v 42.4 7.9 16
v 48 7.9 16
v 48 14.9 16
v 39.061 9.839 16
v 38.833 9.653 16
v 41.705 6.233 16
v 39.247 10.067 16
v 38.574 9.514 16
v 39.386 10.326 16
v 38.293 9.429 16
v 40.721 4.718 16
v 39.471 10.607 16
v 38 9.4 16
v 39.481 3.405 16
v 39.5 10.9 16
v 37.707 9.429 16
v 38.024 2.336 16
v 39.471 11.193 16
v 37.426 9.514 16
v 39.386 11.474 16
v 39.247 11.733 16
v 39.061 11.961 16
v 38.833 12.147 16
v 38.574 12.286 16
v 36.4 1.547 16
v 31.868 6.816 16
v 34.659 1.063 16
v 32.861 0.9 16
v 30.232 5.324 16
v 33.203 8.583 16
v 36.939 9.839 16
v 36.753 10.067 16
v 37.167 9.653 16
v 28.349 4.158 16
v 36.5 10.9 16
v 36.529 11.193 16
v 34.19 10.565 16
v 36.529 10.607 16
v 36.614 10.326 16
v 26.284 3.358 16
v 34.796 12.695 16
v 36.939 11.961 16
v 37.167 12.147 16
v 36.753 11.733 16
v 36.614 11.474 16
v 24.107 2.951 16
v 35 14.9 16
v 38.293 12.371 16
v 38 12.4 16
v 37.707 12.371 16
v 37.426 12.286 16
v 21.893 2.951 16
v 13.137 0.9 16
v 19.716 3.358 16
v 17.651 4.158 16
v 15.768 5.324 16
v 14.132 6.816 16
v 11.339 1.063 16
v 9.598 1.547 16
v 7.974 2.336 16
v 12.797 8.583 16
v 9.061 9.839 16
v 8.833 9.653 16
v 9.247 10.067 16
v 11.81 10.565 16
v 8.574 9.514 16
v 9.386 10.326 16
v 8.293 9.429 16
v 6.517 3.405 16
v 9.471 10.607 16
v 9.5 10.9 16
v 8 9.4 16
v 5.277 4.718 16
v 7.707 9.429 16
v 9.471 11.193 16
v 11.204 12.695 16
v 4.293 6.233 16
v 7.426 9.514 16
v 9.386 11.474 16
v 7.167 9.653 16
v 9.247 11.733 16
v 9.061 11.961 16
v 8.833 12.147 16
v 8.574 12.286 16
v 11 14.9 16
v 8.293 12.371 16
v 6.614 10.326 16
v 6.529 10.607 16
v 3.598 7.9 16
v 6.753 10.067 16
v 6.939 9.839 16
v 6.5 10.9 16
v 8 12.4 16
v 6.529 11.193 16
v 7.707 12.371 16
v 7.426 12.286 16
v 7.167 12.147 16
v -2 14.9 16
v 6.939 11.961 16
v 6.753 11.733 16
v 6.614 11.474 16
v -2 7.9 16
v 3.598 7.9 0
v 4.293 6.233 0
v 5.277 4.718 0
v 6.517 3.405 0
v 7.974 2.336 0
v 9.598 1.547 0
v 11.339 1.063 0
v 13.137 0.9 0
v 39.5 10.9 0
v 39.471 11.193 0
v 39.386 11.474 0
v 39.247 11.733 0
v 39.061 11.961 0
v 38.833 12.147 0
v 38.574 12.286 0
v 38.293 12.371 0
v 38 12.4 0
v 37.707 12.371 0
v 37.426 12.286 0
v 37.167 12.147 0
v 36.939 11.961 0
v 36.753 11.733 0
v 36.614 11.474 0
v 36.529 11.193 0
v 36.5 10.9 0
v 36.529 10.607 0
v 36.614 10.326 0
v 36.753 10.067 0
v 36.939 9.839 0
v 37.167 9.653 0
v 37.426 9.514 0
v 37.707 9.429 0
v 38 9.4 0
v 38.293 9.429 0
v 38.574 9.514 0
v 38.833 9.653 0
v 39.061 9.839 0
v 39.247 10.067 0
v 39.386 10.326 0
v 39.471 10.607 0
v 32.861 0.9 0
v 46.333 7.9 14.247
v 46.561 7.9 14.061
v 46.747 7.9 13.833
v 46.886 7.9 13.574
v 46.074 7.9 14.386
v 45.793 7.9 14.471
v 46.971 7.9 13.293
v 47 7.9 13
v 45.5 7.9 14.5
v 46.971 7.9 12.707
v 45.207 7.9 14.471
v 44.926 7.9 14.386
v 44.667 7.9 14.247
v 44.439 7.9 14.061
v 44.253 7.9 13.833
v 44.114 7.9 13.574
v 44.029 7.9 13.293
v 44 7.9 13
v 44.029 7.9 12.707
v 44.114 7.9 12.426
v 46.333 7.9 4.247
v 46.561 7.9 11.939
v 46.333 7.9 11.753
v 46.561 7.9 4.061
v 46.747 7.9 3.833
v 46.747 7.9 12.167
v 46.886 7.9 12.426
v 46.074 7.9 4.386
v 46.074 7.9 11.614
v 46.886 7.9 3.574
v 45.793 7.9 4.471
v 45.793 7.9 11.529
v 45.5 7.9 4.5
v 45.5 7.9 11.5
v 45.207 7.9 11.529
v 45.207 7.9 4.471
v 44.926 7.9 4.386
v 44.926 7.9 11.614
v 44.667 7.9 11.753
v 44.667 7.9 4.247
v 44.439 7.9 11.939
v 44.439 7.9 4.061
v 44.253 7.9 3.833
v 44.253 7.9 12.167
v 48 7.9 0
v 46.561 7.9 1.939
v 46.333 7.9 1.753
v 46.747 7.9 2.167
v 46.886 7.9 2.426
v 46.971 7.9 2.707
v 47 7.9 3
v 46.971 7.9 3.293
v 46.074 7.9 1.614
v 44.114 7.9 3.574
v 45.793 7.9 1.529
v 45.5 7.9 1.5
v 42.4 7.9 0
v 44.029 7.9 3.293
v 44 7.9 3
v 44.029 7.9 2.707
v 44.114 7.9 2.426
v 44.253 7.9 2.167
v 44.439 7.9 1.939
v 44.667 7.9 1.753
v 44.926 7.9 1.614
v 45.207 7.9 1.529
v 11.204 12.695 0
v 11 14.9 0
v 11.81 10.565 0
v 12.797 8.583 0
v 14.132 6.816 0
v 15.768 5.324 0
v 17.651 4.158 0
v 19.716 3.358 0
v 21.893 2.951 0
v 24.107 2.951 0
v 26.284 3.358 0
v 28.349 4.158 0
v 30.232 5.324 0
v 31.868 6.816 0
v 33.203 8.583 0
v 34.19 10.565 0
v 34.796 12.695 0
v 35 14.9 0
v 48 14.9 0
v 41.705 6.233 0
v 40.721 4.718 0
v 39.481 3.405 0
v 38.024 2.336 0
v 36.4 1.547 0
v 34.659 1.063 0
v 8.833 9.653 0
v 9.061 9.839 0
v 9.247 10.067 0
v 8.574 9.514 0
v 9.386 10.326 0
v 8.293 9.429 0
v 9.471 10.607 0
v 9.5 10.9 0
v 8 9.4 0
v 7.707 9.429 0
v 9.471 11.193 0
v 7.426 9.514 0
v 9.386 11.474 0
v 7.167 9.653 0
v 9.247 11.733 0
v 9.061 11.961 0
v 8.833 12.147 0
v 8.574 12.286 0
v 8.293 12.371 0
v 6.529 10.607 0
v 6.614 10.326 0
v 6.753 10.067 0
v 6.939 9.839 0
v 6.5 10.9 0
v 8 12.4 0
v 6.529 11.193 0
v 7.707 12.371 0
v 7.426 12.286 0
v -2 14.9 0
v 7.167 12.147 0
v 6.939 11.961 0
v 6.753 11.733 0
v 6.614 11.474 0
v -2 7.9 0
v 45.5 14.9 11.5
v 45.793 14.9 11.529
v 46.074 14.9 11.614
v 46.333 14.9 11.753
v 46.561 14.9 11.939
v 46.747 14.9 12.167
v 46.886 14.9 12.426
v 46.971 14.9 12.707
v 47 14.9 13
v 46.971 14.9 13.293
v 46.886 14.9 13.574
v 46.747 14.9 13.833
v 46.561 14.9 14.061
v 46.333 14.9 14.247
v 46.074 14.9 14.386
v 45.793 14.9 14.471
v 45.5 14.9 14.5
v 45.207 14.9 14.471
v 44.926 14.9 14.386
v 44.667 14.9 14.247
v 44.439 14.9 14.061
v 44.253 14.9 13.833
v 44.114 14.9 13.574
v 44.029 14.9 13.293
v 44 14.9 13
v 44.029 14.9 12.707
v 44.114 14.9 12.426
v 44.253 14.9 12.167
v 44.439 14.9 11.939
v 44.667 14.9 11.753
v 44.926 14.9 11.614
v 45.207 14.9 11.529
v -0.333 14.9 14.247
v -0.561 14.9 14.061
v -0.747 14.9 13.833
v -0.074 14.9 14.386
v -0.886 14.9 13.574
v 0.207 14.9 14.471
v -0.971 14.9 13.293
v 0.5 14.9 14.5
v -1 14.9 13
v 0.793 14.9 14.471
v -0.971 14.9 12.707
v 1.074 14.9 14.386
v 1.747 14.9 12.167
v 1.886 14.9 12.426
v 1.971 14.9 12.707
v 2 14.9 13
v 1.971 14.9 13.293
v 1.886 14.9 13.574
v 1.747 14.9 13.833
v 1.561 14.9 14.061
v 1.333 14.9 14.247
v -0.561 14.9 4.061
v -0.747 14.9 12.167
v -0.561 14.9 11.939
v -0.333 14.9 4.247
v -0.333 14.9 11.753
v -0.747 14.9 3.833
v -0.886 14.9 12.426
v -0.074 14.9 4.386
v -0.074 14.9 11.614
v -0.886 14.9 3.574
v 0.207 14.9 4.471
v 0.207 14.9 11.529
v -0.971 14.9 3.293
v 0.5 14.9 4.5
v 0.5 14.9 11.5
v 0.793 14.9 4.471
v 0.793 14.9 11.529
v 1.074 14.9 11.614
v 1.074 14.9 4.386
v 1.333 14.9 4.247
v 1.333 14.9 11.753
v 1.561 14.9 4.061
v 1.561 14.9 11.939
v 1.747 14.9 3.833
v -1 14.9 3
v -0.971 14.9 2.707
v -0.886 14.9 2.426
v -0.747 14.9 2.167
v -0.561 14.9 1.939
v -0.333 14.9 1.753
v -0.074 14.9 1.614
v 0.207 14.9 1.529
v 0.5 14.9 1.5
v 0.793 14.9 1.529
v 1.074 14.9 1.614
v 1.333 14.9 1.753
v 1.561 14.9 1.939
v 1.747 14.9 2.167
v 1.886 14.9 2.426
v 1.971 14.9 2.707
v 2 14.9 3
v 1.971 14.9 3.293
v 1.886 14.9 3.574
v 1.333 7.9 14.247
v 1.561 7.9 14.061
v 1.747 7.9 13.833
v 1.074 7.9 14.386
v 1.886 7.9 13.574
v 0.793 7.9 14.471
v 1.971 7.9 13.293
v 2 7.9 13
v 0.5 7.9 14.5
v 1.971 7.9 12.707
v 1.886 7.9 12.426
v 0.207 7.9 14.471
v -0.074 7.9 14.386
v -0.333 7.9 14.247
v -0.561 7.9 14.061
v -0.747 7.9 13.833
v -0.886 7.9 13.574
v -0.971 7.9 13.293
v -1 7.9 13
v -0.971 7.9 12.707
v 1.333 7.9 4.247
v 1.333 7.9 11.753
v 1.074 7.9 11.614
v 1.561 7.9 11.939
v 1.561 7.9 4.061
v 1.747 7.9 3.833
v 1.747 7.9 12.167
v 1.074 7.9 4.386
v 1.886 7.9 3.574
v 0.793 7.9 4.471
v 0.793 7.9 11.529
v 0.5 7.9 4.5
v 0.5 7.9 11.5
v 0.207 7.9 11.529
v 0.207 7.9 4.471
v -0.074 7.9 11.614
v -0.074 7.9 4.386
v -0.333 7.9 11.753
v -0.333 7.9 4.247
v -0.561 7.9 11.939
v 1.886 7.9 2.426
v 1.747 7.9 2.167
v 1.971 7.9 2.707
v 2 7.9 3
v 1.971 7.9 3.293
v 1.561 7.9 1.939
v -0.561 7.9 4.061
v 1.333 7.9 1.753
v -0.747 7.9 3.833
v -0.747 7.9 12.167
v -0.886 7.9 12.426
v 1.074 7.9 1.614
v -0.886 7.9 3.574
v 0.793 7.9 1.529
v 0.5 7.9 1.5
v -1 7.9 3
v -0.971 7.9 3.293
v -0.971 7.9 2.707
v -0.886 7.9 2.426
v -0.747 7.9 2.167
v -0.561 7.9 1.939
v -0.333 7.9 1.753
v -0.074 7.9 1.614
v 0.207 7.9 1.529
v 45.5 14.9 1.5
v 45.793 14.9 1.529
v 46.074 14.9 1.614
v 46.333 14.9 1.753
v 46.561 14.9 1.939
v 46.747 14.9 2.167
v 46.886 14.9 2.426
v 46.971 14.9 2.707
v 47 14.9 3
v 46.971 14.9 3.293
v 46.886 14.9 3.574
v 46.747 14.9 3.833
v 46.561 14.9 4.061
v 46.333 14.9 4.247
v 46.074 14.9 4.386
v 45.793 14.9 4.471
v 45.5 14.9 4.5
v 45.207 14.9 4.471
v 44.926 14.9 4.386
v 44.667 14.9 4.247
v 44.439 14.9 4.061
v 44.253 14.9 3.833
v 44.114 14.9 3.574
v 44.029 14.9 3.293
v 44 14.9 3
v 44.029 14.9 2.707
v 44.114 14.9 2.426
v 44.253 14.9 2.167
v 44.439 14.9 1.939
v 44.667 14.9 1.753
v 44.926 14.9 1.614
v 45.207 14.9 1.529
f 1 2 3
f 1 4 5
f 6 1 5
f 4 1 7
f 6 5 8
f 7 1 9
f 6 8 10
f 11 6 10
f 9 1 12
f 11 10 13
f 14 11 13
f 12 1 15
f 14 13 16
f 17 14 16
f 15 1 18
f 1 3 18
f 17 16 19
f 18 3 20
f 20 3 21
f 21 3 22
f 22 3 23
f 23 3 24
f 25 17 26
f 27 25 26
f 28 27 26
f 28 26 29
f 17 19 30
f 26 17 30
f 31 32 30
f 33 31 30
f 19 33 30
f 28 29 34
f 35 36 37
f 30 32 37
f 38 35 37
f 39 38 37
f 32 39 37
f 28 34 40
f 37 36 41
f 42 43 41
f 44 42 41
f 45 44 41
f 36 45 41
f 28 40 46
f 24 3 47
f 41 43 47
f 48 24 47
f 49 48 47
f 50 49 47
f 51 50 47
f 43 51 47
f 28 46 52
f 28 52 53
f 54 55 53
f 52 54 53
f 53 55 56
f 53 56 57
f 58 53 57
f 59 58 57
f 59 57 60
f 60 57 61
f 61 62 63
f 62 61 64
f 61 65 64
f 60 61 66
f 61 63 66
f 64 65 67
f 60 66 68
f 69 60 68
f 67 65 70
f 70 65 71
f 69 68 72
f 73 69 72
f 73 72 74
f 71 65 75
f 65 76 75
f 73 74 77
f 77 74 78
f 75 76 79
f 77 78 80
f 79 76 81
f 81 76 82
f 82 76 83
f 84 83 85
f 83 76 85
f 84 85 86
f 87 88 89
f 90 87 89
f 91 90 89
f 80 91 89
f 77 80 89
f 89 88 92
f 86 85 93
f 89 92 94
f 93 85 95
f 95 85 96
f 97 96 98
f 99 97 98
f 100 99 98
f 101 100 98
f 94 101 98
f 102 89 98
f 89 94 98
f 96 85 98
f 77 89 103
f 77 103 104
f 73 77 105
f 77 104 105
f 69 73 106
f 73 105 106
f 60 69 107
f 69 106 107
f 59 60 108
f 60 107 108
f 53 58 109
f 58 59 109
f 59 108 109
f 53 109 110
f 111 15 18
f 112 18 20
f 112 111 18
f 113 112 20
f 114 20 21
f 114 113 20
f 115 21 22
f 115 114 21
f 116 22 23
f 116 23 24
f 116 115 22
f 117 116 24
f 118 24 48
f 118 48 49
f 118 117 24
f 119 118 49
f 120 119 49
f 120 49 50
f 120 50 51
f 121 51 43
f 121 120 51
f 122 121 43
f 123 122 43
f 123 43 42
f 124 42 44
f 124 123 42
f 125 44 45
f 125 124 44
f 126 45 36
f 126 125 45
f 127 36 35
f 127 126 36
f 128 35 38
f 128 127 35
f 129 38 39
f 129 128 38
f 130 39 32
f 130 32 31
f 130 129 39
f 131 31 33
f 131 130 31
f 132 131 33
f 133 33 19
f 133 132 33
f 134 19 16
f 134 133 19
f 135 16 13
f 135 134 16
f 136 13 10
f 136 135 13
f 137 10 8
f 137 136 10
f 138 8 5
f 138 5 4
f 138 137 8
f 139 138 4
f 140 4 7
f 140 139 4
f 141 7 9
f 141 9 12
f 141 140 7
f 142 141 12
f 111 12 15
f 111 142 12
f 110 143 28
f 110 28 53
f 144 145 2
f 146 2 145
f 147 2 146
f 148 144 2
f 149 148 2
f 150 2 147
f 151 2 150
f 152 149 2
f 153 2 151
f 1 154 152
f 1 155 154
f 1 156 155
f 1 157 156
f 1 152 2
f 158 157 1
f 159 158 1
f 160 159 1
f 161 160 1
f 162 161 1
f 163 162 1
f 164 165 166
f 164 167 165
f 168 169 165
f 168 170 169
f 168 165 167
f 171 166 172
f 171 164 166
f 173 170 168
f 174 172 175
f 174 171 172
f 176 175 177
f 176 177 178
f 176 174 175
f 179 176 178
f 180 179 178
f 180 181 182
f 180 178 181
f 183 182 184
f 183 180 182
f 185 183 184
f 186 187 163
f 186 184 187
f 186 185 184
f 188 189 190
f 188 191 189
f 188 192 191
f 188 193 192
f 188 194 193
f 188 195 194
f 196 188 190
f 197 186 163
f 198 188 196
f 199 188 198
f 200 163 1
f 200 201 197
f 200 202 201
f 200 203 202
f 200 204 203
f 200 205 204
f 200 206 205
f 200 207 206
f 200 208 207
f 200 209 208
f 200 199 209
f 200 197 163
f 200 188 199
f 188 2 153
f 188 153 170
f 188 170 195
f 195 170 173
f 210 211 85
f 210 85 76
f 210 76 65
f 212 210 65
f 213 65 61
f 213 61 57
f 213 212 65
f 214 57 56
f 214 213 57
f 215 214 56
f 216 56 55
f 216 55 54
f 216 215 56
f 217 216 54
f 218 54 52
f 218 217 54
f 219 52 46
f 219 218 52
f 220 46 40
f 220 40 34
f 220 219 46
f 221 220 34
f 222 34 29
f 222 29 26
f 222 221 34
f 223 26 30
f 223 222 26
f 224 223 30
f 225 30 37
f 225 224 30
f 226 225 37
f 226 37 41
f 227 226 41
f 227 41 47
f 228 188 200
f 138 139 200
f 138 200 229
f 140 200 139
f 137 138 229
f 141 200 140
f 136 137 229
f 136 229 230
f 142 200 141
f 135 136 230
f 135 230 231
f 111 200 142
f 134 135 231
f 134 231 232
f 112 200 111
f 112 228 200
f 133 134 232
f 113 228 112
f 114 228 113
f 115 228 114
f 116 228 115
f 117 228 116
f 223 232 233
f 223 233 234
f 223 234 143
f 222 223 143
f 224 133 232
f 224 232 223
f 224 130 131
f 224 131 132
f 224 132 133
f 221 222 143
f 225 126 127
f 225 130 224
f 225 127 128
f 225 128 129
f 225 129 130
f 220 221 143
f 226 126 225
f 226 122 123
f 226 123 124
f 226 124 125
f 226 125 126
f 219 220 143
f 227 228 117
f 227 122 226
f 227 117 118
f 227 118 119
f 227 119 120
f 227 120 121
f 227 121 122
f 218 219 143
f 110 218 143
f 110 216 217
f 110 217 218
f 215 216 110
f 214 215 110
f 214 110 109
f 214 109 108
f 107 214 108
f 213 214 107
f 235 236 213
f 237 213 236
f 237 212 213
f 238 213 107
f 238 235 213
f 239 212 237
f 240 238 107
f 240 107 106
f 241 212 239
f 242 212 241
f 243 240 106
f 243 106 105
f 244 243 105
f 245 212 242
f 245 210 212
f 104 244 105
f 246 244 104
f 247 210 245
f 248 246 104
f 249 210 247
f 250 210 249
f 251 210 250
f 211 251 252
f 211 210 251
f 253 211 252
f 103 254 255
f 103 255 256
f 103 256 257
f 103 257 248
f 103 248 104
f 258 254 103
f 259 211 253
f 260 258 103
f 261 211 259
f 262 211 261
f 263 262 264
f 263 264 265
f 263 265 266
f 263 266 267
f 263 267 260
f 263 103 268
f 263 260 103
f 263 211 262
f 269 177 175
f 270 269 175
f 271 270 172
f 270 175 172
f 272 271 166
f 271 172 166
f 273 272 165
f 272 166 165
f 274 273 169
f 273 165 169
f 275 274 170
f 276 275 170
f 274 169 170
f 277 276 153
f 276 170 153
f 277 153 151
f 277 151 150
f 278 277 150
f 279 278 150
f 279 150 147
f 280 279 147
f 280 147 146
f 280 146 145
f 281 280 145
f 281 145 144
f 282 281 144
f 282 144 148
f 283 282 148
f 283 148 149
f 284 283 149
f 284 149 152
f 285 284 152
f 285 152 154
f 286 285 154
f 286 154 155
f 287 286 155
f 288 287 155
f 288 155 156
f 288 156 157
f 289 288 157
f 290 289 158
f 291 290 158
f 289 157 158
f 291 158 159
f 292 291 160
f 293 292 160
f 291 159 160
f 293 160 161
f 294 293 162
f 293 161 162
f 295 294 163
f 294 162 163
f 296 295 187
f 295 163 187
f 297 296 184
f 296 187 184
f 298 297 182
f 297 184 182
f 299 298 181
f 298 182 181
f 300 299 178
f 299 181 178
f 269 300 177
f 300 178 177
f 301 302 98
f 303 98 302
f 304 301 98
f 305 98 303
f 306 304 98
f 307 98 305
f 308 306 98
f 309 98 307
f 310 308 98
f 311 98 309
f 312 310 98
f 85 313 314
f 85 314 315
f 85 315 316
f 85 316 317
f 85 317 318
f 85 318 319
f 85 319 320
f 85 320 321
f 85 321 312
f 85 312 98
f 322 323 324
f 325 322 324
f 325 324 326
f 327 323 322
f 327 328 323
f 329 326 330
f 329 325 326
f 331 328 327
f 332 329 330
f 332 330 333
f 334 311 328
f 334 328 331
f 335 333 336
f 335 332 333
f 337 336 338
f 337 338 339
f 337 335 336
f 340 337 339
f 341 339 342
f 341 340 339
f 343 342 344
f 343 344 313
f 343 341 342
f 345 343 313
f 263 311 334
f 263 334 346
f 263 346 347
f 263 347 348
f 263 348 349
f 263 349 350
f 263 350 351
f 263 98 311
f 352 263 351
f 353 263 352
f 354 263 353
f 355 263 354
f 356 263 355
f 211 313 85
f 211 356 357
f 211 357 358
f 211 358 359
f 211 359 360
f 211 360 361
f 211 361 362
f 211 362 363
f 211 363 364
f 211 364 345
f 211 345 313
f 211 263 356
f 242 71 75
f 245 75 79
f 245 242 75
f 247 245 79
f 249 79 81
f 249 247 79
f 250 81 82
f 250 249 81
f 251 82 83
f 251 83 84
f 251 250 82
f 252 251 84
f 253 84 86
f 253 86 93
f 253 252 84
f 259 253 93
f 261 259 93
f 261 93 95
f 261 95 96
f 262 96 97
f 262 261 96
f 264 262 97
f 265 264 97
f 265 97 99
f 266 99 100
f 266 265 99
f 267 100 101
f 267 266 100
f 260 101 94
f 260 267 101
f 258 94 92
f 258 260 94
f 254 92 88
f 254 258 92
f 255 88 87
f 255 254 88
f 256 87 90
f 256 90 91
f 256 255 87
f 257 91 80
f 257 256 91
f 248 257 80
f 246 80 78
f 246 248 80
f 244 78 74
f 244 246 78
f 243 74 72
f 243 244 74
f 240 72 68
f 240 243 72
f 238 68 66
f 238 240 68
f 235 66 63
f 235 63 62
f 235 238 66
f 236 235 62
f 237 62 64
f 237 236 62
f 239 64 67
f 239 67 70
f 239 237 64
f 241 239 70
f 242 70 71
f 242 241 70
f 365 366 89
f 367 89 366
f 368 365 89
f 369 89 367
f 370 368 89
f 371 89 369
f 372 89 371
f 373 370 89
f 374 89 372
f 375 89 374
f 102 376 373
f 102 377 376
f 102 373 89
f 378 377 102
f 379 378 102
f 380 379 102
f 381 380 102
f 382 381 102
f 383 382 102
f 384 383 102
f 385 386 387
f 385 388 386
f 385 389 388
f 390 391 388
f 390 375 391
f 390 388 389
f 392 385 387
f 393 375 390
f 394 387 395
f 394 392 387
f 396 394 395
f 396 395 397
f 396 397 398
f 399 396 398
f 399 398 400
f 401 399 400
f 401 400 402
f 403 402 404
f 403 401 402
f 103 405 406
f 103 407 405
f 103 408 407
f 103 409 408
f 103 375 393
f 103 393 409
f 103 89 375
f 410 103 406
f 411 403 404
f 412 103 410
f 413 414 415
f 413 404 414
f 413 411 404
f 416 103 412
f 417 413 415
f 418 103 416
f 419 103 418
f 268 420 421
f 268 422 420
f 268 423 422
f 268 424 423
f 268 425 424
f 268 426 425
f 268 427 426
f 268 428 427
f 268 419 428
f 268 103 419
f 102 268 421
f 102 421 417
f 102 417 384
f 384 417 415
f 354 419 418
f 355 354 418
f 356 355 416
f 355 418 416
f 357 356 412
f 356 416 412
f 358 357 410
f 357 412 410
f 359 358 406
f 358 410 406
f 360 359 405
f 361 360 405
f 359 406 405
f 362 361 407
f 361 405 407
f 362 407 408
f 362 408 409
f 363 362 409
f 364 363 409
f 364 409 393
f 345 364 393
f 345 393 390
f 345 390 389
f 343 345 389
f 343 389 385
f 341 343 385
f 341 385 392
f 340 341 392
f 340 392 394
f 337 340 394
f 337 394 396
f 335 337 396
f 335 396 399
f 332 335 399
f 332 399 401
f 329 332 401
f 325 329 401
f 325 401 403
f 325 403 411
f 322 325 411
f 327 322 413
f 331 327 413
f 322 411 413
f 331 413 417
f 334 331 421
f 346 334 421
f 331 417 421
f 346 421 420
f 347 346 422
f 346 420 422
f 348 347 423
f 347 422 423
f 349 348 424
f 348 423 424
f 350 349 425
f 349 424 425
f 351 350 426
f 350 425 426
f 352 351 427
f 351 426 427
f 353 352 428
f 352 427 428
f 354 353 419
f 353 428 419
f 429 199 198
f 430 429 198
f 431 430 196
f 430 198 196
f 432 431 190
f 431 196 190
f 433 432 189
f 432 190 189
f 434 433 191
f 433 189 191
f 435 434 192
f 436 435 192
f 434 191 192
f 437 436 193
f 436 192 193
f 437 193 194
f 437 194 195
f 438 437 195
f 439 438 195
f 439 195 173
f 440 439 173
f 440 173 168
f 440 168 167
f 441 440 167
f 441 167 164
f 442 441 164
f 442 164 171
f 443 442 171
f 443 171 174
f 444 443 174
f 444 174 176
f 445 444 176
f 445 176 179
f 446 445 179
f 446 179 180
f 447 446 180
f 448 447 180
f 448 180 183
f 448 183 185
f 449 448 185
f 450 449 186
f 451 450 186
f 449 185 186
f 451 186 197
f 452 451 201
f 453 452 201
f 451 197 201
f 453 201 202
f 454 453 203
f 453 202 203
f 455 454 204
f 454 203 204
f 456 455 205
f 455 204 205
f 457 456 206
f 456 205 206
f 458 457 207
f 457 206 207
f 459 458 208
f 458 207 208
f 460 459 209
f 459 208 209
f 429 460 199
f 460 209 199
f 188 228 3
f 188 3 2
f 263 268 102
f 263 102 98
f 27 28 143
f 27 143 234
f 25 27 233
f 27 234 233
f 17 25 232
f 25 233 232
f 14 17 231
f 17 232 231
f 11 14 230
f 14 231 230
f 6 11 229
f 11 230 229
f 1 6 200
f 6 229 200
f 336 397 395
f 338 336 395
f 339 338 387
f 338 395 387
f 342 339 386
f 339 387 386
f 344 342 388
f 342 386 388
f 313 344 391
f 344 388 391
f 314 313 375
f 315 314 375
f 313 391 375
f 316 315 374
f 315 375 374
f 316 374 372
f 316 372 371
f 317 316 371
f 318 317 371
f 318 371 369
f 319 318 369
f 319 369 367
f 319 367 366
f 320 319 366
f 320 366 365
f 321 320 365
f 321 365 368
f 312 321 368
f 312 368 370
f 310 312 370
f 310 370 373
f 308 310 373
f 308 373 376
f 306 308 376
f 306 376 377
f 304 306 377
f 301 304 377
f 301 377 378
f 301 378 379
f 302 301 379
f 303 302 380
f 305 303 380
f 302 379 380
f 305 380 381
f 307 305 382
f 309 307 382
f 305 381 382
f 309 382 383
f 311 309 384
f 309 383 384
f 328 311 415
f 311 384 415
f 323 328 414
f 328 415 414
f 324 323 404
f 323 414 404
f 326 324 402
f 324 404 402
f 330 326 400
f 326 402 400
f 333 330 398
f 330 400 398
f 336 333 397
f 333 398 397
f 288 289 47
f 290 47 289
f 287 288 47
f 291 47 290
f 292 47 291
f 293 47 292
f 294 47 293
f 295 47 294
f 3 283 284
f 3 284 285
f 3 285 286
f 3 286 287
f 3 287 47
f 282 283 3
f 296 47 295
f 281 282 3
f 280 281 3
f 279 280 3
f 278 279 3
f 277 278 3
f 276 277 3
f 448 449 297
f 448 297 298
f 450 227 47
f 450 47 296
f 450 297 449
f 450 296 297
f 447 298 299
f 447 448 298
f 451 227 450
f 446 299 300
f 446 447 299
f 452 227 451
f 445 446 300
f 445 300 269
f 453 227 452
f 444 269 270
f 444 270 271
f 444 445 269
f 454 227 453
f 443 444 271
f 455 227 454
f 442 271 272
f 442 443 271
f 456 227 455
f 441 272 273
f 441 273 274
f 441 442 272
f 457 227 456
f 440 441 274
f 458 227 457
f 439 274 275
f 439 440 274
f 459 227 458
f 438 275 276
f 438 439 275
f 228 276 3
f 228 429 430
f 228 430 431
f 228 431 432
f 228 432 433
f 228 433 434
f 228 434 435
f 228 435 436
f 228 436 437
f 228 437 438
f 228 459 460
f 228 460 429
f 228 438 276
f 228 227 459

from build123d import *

# Parameters (mm, degrees)
SKETCH7_R            = 1.5
BOSS_EXTRUDE11_DEPTH = 16
SKETCH8_R            = 1.5
CUT_EXTRUDE1_DEPTH   = 52.078371156
FILLET1_R            = 10


with BuildPart() as part:
    # Sketch7 → Boss-Extrude11 (new body)
    with BuildSketch(Plane.XY):
        with BuildLine():
            ThreePointArc((11, 14.9), (23, 2.9), (35, 14.9))
            Line((35, 14.9), (48, 14.9))
            Line((48, 14.9), (48, 7.9))
            Line((48, 7.9), (42.4, 7.9))
            Line((42.4, 7.9), (42.4, 0.9))
            Line((42.4, 0.9), (3.598076211, 0.9))
            Line((3.598076211, 0.9), (3.598076211, 7.9))
            Line((3.598076211, 7.9), (-2, 7.9))
            Line((-2, 7.9), (-2, 14.9))
            Line((-2, 14.9), (11, 14.9))
        make_face()
        with Locations((38, 10.9)):
            Circle(SKETCH7_R, mode=Mode.SUBTRACT)
        with Locations((8, 10.9)):
            Circle(SKETCH7_R, mode=Mode.SUBTRACT)
    extrude(amount=BOSS_EXTRUDE11_DEPTH)

    # Sketch8 → Cut-Extrude1 (cut, through all)
    with BuildSketch(Plane.XZ.offset(-7.9)):
        with Locations(Location((0.5, 13, 0), (0, 0, 270))):
            Circle(SKETCH8_R)
        with Locations(Location((45.5, 13, 0), (0, 0, 270))):
            Circle(SKETCH8_R)
        with Locations(Location((45.5, 3, 0), (0, 0, 270))):
            Circle(SKETCH8_R)
        with Locations(Location((0.5, 3, 0), (0, 0, 270))):
            Circle(SKETCH8_R)
    extrude(amount=-CUT_EXTRUDE1_DEPTH, mode=Mode.SUBTRACT)

    # Fillet1
    # the kernel refuses this fillet: 10 mm, written as the material it takes off along each edge
    with BuildSketch(Plane(origin=(3.598076211, 0.9, -23.848480035), x_dir=(1, 0, 0), z_dir=(0, 0, 1))) as fillet1_piece_1:
        with BuildLine():
            CenterArc((9.539392014, 10), FILLET1_R, 197.457603124, 72.542396876)
            Line((0, 7), (-0.19078784, 6.94))
            ThreePointArc((-0.19078784, 6.94), (-0.2, 3.5), (-0.2, 0))
            Line((-0.2, 0), (0, -0.2))
            Line((0, -0.2), (9.539392014, -0.2))
            Line((9.539392014, -0.2), (9.539392014, 0))
        make_face()
    extrude(amount=63.696960071, mode=Mode.SUBTRACT)
    with BuildSketch(Plane(origin=(42.4, 0.9, -23.848480035), x_dir=(0, 1, 0), z_dir=(0, 0, 1))) as fillet1_piece_2:
        with BuildLine():
            CenterArc((10, 9.539392014), FILLET1_R, 180, 72.542396876)
            Line((0, 9.539392014), (-0.2, 9.539392014))
            Line((-0.2, 9.539392014), (-0.2, 0))
            Line((-0.2, 0), (0, -0.2))
            ThreePointArc((0, -0.2), (3.5, -0.2), (6.94, -0.19078784))
            Line((6.94, -0.19078784), (7, 0))
        make_face()
    extrude(amount=63.696960071, mode=Mode.SUBTRACT)


solid = part.part
